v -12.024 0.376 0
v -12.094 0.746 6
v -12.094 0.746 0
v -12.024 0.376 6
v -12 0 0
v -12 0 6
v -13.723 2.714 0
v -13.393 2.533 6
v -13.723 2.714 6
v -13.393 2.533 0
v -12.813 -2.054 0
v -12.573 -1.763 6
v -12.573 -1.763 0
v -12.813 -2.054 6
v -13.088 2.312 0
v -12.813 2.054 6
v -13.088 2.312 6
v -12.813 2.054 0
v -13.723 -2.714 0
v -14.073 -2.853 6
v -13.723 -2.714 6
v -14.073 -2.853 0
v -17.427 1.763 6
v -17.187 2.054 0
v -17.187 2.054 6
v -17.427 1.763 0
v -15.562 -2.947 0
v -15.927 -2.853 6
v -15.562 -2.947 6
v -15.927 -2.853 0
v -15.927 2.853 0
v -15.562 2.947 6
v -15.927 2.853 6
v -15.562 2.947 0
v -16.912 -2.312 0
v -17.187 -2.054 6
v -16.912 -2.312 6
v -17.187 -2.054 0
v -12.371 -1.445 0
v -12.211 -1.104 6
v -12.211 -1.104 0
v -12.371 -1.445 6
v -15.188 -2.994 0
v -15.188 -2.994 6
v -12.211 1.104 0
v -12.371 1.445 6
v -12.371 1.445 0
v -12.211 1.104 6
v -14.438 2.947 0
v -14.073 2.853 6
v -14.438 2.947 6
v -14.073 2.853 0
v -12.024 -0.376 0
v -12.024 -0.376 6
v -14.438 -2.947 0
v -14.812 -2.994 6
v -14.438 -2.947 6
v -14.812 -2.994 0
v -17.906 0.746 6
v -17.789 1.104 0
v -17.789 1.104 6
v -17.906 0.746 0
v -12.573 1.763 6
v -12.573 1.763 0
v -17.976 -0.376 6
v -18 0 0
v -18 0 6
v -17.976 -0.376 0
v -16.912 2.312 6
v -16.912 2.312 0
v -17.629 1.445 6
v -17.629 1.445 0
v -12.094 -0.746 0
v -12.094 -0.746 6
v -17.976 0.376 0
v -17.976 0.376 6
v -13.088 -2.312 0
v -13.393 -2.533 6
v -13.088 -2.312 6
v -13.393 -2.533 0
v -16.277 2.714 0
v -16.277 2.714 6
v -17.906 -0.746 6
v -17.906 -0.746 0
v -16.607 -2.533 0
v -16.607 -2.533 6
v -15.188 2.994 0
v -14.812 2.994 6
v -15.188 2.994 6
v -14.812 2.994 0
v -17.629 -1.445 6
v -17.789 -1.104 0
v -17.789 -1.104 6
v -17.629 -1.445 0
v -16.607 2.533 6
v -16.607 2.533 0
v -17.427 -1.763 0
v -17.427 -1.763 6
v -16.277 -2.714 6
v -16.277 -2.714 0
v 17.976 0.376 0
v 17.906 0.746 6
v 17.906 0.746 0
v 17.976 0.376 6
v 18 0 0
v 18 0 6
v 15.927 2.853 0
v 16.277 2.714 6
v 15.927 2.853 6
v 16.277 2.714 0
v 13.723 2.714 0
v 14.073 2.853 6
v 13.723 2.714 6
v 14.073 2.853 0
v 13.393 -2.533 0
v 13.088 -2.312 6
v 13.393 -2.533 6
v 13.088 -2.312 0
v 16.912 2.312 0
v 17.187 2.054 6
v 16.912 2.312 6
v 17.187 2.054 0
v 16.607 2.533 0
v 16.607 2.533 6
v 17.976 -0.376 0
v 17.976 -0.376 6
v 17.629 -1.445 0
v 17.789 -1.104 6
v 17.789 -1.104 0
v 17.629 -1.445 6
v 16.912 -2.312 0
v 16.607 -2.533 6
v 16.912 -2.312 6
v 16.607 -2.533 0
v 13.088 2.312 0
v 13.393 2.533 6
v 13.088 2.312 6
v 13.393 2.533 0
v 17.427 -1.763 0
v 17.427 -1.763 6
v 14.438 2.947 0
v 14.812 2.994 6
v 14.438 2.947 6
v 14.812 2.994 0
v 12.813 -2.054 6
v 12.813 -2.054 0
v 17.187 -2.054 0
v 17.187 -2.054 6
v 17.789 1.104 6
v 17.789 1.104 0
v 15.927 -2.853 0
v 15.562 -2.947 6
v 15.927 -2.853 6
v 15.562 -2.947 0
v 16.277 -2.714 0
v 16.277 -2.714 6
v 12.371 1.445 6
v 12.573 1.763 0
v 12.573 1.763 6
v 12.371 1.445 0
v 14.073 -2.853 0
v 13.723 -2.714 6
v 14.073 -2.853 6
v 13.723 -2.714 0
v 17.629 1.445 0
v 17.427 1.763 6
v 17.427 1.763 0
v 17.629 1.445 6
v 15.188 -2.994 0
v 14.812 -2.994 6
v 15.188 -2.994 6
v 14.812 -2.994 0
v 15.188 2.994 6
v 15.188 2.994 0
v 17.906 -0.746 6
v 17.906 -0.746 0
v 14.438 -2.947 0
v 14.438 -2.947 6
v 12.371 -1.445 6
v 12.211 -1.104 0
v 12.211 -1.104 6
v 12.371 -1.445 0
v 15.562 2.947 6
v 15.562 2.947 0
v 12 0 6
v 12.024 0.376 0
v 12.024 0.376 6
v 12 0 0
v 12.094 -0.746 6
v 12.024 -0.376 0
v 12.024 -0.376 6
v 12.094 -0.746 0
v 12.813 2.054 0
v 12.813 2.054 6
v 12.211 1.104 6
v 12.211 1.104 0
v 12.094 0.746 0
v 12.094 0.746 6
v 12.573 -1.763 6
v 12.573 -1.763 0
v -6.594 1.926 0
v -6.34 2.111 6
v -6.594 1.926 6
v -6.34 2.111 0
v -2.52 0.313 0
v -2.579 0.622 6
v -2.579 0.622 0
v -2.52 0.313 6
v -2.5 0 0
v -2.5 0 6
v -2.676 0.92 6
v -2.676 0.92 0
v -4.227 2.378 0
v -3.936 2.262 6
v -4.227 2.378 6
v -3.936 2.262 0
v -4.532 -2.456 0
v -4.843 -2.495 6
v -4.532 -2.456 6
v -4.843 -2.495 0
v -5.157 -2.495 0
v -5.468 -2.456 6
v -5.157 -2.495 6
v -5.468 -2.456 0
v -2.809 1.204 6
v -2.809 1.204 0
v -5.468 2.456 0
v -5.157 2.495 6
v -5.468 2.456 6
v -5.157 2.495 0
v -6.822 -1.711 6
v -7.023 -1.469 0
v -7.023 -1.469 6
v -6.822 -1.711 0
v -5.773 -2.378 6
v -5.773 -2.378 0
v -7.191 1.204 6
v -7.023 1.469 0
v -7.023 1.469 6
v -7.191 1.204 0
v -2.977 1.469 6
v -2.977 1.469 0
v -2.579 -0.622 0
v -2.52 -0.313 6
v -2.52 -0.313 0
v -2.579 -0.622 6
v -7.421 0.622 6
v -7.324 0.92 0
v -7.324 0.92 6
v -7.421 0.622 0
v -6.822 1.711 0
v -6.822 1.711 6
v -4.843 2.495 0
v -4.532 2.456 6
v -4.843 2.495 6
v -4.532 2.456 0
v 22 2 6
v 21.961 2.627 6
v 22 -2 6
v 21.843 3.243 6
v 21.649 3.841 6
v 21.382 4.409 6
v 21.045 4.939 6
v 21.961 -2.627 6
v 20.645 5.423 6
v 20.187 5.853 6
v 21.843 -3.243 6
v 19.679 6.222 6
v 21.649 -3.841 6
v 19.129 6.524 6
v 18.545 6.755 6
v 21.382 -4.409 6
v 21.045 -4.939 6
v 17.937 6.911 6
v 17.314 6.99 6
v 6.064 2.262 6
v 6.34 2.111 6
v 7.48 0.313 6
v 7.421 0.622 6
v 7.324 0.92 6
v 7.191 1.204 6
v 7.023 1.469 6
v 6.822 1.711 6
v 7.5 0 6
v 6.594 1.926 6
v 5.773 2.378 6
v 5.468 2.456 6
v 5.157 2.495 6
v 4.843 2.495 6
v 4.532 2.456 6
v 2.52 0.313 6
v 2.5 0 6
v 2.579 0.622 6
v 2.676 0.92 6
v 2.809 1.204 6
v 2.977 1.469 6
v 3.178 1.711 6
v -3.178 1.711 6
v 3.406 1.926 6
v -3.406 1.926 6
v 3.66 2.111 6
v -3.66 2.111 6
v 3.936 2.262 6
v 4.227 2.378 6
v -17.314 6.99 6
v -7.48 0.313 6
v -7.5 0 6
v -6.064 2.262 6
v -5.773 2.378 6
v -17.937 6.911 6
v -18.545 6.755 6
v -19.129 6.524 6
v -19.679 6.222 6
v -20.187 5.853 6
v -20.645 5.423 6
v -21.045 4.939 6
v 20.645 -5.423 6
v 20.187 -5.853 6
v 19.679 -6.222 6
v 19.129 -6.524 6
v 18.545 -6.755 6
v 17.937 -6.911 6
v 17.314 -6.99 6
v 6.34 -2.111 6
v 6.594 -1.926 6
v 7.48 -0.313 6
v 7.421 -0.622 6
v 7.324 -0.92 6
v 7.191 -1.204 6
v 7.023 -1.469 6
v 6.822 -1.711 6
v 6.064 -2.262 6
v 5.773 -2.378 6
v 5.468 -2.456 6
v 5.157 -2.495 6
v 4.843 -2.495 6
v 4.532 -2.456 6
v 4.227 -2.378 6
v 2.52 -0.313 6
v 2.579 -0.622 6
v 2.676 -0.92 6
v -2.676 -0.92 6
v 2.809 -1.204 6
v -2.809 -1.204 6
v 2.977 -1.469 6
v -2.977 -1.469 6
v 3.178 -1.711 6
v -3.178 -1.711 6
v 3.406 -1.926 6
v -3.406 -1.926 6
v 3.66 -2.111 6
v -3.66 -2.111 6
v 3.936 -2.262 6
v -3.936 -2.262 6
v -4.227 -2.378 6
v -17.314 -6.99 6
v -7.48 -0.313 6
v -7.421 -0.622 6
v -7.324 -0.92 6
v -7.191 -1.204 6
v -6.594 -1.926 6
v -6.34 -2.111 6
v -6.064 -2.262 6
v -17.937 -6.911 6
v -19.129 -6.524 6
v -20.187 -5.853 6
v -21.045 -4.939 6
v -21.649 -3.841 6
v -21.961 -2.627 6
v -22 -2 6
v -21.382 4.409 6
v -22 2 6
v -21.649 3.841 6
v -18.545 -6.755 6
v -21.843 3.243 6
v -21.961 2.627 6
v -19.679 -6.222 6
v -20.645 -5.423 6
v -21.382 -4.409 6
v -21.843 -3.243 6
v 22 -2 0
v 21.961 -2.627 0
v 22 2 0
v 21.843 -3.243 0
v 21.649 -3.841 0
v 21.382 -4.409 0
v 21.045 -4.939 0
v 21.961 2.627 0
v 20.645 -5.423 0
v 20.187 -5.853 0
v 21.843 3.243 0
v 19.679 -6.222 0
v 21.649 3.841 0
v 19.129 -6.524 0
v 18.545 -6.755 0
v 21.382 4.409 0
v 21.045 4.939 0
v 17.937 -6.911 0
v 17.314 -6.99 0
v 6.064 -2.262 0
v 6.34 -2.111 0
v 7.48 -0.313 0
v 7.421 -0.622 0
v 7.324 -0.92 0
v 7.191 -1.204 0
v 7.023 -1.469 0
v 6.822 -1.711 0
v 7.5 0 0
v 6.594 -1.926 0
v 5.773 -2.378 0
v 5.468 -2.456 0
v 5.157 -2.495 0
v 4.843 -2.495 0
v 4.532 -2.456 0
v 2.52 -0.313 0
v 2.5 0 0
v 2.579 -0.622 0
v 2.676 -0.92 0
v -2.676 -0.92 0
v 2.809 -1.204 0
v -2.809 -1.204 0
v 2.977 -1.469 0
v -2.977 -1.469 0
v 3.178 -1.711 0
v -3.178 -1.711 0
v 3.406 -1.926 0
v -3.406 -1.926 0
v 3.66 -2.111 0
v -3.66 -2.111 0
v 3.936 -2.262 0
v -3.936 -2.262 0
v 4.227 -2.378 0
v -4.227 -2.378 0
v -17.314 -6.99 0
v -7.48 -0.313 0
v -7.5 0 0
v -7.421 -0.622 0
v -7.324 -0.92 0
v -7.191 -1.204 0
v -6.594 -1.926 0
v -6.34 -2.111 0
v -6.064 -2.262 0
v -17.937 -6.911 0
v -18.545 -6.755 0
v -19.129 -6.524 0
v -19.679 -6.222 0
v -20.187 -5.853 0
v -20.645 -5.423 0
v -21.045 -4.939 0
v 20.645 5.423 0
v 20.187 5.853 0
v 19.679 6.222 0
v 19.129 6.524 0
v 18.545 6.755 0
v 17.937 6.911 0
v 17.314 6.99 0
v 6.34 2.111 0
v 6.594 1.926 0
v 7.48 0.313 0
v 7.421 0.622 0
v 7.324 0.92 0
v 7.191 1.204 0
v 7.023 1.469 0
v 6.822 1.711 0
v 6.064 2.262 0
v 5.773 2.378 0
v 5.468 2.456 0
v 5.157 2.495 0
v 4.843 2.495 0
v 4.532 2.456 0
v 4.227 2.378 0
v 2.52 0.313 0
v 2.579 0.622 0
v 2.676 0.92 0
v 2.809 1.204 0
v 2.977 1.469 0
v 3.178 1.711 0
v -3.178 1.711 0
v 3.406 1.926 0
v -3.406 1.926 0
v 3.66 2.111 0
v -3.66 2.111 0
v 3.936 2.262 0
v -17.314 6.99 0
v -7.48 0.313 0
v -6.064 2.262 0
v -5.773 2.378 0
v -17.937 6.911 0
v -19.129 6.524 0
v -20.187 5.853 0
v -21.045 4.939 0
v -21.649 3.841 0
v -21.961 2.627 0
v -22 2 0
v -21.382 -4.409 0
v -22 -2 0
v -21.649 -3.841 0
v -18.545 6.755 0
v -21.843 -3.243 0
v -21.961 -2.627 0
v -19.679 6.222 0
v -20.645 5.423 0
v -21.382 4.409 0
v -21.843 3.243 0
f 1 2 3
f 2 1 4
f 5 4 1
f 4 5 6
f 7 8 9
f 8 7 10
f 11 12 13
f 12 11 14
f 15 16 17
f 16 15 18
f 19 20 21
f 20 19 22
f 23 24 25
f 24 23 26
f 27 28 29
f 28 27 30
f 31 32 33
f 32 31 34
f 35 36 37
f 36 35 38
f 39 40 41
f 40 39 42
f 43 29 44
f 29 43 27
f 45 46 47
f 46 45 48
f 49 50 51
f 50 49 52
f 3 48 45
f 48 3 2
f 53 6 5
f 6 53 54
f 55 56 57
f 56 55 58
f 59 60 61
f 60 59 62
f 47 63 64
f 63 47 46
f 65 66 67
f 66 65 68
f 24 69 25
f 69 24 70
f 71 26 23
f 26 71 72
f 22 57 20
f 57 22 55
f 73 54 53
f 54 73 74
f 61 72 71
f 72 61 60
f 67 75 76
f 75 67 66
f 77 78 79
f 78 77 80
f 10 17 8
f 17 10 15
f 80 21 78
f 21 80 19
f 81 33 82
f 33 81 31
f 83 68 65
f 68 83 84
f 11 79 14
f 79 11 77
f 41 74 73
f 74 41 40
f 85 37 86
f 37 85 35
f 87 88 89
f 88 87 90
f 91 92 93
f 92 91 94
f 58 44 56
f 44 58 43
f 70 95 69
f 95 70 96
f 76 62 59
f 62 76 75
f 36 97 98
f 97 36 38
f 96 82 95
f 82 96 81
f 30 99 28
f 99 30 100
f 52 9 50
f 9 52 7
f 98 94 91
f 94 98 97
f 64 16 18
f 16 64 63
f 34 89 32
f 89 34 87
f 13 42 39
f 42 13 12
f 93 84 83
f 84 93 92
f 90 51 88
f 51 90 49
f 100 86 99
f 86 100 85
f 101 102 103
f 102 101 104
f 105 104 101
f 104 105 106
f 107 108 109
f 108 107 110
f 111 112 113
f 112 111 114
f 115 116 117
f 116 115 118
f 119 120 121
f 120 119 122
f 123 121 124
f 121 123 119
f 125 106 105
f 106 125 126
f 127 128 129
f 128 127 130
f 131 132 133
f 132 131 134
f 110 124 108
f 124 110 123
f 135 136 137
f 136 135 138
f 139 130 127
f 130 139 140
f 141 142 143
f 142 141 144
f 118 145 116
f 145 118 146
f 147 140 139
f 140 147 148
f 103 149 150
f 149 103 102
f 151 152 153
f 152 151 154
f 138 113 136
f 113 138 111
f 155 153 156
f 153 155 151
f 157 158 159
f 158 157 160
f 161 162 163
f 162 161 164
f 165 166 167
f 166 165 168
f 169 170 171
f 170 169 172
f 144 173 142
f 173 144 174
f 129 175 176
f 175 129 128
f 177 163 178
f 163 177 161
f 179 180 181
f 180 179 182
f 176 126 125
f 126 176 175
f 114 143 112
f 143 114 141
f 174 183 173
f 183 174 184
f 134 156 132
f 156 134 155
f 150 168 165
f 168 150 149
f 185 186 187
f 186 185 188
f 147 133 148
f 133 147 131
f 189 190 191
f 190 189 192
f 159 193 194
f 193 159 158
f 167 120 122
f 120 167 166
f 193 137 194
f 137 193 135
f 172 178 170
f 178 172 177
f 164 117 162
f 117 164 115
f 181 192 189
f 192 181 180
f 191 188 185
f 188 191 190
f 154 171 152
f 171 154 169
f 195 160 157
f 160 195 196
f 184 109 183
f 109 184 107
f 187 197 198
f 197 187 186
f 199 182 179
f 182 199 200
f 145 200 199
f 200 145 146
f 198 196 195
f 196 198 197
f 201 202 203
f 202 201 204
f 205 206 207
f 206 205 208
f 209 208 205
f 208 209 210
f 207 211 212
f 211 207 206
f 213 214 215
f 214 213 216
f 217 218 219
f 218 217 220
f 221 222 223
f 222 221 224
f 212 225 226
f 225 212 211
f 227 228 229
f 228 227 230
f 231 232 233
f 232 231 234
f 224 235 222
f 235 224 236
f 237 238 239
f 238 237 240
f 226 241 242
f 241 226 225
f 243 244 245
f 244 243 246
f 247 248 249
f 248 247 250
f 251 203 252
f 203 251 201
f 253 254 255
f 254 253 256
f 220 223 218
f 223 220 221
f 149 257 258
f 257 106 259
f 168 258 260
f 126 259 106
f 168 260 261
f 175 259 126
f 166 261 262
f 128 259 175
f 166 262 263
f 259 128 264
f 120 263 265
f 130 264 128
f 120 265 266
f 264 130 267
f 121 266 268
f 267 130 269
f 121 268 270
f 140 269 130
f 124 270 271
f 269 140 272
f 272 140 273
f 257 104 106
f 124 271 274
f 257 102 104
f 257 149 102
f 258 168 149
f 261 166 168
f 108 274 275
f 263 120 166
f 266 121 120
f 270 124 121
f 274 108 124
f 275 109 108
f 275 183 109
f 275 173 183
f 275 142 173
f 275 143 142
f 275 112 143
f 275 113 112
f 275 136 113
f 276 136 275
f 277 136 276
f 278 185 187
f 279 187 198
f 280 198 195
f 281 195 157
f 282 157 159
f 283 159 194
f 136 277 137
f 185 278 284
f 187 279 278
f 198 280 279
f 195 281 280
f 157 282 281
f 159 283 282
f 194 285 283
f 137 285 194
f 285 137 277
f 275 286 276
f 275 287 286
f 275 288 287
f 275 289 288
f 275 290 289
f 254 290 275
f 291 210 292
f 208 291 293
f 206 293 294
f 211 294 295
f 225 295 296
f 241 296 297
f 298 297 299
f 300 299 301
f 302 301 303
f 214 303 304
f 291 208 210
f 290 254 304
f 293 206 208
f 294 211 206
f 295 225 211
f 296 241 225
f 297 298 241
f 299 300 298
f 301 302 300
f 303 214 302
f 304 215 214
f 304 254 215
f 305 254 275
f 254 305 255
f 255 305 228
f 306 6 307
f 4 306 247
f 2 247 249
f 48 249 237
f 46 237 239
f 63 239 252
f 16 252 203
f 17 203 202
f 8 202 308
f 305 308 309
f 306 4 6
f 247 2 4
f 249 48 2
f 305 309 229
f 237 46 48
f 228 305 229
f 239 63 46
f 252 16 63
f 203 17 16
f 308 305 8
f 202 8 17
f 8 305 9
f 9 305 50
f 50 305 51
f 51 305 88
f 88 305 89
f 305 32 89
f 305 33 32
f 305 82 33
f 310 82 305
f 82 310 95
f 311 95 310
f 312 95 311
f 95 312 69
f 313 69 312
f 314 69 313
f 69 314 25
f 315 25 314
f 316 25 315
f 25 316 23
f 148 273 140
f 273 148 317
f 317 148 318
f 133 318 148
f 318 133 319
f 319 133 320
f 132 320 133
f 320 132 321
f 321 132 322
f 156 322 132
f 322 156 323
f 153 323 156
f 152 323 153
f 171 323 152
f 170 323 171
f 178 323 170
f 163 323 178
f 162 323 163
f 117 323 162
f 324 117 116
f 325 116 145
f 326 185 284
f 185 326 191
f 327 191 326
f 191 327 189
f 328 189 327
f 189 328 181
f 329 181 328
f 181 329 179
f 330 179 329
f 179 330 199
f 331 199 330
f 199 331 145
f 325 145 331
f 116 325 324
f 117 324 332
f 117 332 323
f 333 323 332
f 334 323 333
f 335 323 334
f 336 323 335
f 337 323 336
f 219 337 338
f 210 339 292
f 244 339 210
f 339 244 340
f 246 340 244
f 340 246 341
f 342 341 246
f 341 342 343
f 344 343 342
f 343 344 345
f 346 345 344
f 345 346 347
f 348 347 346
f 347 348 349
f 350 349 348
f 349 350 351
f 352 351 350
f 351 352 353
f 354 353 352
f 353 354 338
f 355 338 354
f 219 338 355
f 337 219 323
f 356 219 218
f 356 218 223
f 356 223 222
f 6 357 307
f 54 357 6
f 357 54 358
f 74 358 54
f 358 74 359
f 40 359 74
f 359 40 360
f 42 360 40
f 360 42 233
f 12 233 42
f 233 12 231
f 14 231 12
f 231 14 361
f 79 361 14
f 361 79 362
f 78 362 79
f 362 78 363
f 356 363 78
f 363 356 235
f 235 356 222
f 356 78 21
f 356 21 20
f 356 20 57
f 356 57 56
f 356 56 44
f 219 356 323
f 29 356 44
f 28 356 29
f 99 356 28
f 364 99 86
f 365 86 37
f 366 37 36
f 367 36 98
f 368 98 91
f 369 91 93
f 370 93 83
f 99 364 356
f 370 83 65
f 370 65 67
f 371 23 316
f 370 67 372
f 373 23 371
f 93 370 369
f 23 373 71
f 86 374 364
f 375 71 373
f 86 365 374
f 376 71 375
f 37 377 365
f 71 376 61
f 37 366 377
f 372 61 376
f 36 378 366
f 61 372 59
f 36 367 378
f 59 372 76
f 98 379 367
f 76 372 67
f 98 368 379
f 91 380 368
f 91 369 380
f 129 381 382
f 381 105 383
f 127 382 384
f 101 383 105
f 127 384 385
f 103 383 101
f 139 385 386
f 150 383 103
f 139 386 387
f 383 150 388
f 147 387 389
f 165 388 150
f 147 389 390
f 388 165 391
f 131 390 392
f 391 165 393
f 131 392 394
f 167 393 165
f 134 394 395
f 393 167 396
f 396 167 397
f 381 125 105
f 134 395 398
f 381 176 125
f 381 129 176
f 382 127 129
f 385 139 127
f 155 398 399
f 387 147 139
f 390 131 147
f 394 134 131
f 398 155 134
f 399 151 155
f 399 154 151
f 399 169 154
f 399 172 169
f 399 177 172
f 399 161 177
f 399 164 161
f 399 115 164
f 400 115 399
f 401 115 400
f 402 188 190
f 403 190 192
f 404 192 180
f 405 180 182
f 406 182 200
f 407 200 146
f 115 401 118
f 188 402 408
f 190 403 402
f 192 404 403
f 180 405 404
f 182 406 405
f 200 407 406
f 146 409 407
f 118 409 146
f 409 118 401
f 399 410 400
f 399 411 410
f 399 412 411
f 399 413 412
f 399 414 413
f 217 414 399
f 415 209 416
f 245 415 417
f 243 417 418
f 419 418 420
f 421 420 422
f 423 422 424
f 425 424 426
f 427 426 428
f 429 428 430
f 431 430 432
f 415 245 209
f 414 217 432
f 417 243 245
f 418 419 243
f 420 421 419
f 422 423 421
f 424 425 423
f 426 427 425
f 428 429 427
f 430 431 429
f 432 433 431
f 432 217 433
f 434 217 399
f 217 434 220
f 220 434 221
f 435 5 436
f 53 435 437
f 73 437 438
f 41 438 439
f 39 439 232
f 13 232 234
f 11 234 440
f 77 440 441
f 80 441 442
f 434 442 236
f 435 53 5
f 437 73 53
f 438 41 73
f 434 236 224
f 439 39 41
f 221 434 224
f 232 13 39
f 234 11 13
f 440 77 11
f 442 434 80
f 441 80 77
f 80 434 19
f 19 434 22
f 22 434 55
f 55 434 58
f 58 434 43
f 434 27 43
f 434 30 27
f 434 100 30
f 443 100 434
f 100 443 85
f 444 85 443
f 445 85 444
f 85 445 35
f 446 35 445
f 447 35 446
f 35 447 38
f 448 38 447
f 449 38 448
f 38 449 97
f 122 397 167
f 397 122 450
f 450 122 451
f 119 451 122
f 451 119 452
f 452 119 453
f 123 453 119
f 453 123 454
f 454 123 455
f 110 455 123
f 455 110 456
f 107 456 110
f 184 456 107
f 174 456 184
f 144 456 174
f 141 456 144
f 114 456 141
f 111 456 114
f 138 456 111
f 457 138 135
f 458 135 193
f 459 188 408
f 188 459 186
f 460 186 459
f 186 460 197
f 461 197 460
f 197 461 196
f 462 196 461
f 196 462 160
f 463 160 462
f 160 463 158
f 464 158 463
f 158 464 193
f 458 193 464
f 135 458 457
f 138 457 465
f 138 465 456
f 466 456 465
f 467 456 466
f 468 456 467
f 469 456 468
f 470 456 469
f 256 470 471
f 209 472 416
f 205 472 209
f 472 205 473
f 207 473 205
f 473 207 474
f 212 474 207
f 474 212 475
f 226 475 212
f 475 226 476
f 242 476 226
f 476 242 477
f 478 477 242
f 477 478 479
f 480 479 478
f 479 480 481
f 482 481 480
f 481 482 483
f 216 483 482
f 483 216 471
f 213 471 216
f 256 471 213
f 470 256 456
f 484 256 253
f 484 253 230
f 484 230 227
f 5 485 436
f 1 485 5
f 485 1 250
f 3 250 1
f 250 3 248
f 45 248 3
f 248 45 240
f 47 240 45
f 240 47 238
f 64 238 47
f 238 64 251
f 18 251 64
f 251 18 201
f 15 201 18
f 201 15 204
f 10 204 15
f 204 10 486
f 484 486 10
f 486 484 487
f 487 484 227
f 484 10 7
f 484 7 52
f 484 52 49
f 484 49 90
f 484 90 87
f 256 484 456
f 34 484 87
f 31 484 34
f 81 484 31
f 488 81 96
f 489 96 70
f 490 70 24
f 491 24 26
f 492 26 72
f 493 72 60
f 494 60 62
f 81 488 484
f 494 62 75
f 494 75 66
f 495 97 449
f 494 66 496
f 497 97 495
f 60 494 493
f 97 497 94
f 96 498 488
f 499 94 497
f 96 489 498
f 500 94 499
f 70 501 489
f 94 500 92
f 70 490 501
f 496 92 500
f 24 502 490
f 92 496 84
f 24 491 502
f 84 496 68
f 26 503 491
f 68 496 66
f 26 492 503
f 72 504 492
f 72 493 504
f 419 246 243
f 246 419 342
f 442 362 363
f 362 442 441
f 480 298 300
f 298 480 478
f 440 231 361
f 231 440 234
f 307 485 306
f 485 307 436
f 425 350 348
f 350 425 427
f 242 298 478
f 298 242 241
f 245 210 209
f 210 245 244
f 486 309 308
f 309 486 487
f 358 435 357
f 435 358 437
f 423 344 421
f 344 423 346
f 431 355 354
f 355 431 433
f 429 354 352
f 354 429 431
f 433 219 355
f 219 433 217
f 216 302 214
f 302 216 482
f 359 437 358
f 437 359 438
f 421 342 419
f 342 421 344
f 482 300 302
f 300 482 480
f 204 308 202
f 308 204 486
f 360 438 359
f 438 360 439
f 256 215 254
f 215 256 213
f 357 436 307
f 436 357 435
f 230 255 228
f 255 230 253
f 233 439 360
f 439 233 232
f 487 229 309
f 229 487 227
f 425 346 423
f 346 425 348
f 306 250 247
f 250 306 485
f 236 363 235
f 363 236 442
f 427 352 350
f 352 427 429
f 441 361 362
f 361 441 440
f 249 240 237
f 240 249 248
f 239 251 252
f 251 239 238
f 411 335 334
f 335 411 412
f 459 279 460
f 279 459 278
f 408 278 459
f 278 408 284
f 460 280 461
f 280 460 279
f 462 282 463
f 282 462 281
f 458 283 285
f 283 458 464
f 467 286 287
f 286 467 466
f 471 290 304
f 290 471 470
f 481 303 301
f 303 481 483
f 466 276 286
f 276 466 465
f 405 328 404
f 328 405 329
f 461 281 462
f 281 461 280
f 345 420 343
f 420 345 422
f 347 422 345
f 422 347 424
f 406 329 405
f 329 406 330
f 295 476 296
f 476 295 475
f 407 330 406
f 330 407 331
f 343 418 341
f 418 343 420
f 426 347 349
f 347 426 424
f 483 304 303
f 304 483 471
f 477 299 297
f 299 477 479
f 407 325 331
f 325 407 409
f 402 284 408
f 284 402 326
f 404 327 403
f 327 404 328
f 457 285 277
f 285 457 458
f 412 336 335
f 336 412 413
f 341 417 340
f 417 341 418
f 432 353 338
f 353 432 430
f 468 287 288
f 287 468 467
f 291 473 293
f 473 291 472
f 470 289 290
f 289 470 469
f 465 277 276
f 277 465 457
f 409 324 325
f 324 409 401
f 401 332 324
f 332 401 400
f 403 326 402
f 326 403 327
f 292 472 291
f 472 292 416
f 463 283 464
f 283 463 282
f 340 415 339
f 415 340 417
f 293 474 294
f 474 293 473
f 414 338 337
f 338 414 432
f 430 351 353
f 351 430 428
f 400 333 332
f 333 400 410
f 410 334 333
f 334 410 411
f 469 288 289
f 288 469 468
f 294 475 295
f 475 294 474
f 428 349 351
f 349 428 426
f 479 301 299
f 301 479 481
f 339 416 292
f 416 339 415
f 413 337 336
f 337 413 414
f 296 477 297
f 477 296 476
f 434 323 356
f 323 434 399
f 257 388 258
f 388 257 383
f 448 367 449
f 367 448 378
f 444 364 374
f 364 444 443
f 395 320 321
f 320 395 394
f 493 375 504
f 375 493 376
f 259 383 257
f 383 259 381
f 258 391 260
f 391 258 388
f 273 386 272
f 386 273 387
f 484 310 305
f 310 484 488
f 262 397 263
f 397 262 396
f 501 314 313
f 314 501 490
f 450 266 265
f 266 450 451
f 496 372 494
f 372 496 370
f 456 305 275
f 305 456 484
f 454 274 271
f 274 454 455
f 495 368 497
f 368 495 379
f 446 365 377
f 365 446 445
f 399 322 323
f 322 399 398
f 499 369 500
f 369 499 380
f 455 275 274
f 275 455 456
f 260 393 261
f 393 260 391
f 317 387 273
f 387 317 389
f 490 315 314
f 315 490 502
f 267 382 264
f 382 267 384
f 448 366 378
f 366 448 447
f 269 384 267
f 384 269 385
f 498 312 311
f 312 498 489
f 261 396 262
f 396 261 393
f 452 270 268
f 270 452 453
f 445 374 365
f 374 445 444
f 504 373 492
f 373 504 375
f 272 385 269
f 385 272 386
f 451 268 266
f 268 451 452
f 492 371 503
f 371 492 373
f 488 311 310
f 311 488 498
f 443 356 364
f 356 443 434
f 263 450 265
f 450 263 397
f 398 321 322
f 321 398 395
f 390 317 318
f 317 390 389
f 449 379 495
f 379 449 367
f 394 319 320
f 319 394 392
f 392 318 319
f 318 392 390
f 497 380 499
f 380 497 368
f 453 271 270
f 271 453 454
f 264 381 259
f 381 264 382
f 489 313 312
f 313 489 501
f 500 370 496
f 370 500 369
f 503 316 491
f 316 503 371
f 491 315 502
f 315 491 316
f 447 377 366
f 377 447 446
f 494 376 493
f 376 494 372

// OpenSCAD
$fn = 50;


difference() {
	union() {
		hull() {
			translate(v = [-17.0000000000, 2.0000000000, 0]) {
				cylinder(h = 6, r = 5);
			}
			translate(v = [17.0000000000, 2.0000000000, 0]) {
				cylinder(h = 6, r = 5);
			}
			translate(v = [-17.0000000000, -2.0000000000, 0]) {
				cylinder(h = 6, r = 5);
			}
			translate(v = [17.0000000000, -2.0000000000, 0]) {
				cylinder(h = 6, r = 5);
			}
		}
	}
	union() {
		#translate(v = [-15.0000000000, 0.0000000000, 0]) {
			cylinder(h = 6, r = 3.0000000000);
		}
		#translate(v = [15.0000000000, 0.0000000000, 0]) {
			cylinder(h = 6, r = 3.0000000000);
		}
		#translate(v = [-15.0000000000, 0.0000000000, -100.0000000000]) {
			cylinder(h = 200, r = 3.0000000000);
		}
		#translate(v = [-15.0000000000, 0.0000000000, -100.0000000000]) {
			cylinder(h = 200, r = 3.0000000000);
		}
		#translate(v = [15.0000000000, 0.0000000000, -100.0000000000]) {
			cylinder(h = 200, r = 3.0000000000);
		}
		#translate(v = [15.0000000000, 0.0000000000, -100.0000000000]) {
			cylinder(h = 200, r = 3.0000000000);
		}
		#translate(v = [-15.0000000000, 0.0000000000, 0]) {
			cylinder(h = 6, r = 1.5000000000);
		}
		#translate(v = [15.0000000000, 0.0000000000, 0]) {
			cylinder(h = 6, r = 1.5000000000);
		}
		#translate(v = [-15.0000000000, 0.0000000000, 0]) {
			cylinder(h = 6, r = 1.5000000000);
		}
		#translate(v = [15.0000000000, 0.0000000000, 0]) {
			cylinder(h = 6, r = 1.5000000000);
		}
		#translate(v = [-15.0000000000, 0.0000000000, 0]) {
			cylinder(h = 6, r = 1.5000000000);
		}
		#translate(v = [15.0000000000, 0.0000000000, 0]) {
			cylinder(h = 6, r = 1.5000000000);
		}
		#translate(v = [-5.0000000000, 0, 0]) {
			cylinder(h = 6, r = 2.5000000000);
		}
		#translate(v = [5.0000000000, 0, 0]) {
			cylinder(h = 6, r = 2.5000000000);
		}
	}
}
